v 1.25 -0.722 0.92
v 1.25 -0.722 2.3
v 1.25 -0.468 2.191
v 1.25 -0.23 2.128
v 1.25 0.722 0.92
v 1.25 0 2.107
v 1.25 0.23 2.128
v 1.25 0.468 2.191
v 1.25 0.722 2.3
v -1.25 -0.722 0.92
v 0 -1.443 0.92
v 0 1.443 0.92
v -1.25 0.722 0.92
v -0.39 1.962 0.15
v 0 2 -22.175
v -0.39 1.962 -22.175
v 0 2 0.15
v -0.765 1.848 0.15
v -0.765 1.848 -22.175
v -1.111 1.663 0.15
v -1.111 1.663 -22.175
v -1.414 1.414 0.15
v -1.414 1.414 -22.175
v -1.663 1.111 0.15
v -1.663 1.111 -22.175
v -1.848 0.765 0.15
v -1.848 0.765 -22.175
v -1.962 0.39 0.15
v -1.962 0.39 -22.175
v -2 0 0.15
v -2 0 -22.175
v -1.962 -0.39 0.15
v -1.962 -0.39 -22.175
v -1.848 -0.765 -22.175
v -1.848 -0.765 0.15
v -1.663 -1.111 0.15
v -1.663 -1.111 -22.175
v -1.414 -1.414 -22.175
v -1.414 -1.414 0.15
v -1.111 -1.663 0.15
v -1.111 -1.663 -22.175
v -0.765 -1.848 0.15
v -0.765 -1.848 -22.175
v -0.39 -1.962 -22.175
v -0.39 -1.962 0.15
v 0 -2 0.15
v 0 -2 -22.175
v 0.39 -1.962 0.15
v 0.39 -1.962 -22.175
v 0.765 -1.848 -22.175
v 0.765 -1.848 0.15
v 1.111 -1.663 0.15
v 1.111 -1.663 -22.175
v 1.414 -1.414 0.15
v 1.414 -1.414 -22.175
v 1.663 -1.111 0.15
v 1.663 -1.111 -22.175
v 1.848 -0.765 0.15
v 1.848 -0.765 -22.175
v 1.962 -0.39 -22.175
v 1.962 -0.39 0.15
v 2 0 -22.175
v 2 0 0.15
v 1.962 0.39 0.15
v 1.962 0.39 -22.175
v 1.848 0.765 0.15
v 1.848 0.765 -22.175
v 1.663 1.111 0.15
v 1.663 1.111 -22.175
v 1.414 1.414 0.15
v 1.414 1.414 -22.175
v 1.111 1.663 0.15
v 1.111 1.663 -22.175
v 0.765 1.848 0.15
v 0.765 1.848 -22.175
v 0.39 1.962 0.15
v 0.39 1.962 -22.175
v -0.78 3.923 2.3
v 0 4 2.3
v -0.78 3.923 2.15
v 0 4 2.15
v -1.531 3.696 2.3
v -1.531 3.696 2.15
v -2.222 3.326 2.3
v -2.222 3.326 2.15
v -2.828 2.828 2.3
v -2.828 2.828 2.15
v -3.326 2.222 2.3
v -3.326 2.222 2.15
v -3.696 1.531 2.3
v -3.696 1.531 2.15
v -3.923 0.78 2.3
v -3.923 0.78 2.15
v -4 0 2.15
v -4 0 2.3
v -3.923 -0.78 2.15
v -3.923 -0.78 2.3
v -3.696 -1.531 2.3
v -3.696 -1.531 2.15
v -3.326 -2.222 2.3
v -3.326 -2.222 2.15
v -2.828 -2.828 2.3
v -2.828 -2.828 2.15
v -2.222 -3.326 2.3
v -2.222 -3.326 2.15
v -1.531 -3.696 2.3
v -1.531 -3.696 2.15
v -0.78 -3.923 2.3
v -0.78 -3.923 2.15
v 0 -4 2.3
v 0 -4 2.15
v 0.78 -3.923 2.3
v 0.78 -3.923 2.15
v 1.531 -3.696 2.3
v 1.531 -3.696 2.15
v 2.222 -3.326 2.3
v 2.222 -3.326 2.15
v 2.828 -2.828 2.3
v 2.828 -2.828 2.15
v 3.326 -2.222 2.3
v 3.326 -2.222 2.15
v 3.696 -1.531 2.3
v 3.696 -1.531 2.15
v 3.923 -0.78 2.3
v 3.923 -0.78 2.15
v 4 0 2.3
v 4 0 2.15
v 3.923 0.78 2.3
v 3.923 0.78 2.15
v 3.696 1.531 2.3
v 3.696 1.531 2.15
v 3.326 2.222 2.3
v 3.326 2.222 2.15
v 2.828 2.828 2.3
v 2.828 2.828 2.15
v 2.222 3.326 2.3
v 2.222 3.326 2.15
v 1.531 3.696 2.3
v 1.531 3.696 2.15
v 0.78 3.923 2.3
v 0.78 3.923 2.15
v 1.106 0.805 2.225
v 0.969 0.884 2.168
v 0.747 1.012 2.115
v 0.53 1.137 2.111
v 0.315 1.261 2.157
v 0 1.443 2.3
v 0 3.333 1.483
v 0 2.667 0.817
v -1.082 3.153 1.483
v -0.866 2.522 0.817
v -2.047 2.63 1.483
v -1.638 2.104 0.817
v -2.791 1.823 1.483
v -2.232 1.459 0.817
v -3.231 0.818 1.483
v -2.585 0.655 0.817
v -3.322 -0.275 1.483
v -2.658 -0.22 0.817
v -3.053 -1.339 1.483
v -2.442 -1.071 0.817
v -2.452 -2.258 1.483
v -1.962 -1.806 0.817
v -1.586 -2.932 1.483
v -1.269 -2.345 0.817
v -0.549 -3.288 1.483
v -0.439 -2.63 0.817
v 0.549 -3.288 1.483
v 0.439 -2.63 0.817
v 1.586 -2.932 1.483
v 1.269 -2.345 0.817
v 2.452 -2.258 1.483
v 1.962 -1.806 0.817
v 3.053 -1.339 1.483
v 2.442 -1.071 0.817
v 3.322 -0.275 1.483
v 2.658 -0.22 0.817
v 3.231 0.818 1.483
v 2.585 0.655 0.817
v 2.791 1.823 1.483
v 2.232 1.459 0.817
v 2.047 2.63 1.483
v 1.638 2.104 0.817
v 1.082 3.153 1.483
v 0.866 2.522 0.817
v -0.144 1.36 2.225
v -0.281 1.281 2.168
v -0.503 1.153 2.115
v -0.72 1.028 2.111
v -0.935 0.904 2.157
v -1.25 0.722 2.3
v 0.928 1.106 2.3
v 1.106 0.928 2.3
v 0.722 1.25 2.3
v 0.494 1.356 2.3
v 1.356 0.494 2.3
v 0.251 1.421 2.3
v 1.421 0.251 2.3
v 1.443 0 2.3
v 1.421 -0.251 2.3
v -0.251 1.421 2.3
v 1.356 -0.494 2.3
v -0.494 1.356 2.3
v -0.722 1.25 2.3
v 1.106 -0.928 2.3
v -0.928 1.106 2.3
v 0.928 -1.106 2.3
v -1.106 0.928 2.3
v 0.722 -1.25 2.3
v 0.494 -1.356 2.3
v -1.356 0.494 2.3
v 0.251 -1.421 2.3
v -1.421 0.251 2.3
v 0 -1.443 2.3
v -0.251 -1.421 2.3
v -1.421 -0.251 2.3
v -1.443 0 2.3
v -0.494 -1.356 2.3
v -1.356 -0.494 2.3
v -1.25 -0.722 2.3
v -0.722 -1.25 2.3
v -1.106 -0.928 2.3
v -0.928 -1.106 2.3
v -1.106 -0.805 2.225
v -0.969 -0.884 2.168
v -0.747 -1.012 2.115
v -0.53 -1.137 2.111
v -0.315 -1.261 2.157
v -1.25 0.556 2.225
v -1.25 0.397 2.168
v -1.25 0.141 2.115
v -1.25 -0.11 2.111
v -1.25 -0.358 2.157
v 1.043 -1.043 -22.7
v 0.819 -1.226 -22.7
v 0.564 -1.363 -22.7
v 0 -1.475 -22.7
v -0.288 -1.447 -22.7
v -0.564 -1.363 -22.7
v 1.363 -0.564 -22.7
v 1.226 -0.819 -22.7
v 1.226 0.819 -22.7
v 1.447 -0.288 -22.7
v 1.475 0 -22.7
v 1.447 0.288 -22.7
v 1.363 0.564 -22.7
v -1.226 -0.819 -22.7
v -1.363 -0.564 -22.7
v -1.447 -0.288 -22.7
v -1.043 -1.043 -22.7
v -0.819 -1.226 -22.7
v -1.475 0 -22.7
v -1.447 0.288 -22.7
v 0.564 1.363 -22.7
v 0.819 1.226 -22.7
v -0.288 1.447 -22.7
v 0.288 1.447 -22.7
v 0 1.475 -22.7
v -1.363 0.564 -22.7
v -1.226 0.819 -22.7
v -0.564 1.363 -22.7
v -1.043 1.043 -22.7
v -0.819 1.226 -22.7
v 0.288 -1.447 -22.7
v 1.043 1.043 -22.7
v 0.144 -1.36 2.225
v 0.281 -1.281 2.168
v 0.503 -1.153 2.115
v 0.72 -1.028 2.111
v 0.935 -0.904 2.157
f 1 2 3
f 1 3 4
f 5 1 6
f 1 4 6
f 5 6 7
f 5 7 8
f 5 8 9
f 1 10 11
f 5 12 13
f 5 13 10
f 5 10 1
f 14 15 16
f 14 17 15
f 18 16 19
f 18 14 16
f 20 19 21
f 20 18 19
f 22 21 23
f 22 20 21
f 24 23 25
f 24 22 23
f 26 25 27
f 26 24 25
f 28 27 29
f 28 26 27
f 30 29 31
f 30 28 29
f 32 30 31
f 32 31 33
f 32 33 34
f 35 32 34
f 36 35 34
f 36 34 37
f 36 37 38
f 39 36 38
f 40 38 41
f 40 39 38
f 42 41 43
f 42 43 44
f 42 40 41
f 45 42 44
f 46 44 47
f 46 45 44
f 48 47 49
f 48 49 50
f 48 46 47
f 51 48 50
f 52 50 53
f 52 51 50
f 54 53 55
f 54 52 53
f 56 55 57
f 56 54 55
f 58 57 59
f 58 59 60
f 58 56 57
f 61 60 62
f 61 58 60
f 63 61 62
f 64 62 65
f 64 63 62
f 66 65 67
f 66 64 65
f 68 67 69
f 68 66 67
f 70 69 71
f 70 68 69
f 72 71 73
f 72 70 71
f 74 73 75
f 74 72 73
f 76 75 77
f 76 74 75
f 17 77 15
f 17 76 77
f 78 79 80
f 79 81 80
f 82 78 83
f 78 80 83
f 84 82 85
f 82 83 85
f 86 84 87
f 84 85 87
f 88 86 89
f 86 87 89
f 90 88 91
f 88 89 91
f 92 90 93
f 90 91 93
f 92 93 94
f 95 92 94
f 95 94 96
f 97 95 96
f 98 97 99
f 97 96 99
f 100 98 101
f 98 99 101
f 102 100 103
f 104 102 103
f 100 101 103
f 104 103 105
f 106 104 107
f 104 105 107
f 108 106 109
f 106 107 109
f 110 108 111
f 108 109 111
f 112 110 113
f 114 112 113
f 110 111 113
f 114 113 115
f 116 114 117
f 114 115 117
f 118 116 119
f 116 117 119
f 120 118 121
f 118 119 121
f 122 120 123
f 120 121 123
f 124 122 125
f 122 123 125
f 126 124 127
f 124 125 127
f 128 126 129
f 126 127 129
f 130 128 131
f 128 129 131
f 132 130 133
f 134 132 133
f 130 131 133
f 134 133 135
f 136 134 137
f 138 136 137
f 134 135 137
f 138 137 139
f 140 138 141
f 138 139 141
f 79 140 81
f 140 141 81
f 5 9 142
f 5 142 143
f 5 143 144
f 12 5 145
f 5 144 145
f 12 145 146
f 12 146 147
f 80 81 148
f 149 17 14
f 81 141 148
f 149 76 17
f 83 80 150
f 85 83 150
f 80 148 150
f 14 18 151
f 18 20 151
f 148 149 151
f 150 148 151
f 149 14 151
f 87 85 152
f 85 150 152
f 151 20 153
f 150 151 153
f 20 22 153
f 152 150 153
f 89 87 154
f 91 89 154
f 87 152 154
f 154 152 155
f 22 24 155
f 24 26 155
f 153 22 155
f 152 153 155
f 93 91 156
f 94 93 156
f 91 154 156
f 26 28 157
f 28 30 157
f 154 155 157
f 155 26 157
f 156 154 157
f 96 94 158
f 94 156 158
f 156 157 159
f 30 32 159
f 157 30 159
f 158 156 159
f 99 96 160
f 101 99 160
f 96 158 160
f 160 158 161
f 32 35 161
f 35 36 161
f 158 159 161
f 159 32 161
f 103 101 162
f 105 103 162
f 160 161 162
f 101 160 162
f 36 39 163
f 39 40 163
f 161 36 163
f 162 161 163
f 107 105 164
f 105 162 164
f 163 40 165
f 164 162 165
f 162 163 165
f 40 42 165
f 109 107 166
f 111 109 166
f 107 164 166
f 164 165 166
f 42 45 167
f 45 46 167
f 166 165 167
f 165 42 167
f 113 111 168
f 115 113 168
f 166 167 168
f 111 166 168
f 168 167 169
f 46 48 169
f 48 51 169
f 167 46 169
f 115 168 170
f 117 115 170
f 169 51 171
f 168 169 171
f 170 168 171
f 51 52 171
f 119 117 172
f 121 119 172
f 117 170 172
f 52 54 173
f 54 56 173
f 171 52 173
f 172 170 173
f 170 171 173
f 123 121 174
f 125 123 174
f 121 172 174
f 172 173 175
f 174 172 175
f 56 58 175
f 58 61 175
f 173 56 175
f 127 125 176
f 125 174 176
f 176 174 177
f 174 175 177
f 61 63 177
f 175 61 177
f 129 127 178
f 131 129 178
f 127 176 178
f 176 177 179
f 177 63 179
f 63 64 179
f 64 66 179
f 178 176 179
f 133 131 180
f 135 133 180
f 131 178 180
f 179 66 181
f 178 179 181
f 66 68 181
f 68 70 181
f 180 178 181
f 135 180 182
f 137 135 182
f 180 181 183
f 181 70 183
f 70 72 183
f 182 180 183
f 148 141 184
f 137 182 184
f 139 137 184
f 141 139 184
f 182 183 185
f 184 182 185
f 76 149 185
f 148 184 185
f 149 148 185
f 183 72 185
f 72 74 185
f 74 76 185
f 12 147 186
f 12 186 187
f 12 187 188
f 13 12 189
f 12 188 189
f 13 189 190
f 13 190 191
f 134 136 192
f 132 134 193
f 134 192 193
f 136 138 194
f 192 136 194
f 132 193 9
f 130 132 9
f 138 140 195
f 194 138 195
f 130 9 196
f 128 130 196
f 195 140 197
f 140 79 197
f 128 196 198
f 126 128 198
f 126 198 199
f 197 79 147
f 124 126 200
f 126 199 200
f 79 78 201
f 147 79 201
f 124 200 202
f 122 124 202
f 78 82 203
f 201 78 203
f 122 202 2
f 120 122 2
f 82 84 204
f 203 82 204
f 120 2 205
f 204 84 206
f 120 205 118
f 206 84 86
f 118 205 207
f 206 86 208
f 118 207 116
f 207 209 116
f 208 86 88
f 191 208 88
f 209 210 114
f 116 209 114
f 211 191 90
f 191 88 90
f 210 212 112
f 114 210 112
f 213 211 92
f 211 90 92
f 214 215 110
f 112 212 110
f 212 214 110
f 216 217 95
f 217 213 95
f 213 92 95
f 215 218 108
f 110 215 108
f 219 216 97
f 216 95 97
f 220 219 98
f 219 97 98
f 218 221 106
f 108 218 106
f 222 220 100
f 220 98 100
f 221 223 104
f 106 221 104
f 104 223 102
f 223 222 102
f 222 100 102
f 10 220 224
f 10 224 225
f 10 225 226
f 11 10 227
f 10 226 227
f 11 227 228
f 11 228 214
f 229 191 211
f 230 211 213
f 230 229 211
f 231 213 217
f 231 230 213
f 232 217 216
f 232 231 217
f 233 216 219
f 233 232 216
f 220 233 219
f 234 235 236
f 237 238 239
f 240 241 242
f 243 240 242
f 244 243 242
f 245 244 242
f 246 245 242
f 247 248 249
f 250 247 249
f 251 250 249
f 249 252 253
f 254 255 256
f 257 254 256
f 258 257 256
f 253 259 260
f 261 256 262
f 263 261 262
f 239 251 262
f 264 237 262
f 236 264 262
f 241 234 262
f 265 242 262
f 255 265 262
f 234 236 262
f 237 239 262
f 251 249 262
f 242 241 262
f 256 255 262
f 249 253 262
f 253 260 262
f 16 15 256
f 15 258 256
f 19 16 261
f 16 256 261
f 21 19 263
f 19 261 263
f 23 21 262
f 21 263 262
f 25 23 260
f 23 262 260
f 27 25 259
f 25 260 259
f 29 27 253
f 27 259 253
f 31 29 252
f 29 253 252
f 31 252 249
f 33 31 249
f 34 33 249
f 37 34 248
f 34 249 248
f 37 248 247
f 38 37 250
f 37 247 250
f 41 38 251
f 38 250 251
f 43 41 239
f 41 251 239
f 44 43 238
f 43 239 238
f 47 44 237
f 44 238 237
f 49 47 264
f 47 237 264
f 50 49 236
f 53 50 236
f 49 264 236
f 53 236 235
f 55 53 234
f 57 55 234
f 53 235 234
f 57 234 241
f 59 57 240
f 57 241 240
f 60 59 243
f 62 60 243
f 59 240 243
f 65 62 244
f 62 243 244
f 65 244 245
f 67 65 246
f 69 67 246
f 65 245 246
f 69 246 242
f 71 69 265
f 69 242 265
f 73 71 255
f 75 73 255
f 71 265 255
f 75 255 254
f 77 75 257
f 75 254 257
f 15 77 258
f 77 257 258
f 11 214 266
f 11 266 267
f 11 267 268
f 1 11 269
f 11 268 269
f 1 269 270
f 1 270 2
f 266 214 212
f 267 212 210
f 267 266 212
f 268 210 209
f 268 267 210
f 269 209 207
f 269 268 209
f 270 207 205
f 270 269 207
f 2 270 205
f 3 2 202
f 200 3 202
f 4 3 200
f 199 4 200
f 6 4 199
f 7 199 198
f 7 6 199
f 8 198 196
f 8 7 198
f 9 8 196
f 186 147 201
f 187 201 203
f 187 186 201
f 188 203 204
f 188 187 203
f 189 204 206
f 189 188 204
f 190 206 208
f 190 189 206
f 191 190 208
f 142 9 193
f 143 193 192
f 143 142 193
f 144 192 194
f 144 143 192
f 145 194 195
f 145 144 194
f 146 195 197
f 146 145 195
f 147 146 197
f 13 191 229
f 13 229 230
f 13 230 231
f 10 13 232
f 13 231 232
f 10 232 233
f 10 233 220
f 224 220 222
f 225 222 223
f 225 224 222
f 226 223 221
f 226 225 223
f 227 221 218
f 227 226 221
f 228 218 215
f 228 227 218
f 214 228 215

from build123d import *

# Parameters (mm, degrees)
CUT_EXTRUDE2_DEPTH = 1.38
SKETCH6_R          = 1.443375673
CUT_EXTRUDE3_DEPTH = 1.38
CUT_EXTRUDE3_TAPER = 45


with BuildPart() as part:
    # Sketch14 → Revolve1 (revolve)
    with BuildSketch(Plane(origin=(0, 0, 0), x_dir=(0, 0, -1), z_dir=(1, 0, 0))):
        Polygon((-2.3, 0), (-2.3, 4), (-2.15, 4), (-0.15, 2), (0, 2), (22.175, 2), (22.7, 1.475), (22.7, 0), align=None)
    revolve(axis=Axis((0, 0, -22.7), (0, 0, 1)))

    # Sketch5 → Cut-Extrude2 (cut)
    with BuildSketch(Plane.XY.offset(2.3)):
        Polygon((0, -1.443375673), (1.25, -0.721687836), (1.25, 0.721687836), (0, 1.443375673), (-1.25, 0.721687836), (-1.25, -0.721687836), align=None)
    extrude(amount=-CUT_EXTRUDE2_DEPTH, mode=Mode.SUBTRACT)

    # Sketch6 → Cut-Extrude3 (cut)
    with BuildSketch(Plane.XY.offset(2.3)):
        Circle(SKETCH6_R)
    extrude(amount=-CUT_EXTRUDE3_DEPTH, taper=CUT_EXTRUDE3_TAPER, mode=Mode.SUBTRACT)


solid = part.part
